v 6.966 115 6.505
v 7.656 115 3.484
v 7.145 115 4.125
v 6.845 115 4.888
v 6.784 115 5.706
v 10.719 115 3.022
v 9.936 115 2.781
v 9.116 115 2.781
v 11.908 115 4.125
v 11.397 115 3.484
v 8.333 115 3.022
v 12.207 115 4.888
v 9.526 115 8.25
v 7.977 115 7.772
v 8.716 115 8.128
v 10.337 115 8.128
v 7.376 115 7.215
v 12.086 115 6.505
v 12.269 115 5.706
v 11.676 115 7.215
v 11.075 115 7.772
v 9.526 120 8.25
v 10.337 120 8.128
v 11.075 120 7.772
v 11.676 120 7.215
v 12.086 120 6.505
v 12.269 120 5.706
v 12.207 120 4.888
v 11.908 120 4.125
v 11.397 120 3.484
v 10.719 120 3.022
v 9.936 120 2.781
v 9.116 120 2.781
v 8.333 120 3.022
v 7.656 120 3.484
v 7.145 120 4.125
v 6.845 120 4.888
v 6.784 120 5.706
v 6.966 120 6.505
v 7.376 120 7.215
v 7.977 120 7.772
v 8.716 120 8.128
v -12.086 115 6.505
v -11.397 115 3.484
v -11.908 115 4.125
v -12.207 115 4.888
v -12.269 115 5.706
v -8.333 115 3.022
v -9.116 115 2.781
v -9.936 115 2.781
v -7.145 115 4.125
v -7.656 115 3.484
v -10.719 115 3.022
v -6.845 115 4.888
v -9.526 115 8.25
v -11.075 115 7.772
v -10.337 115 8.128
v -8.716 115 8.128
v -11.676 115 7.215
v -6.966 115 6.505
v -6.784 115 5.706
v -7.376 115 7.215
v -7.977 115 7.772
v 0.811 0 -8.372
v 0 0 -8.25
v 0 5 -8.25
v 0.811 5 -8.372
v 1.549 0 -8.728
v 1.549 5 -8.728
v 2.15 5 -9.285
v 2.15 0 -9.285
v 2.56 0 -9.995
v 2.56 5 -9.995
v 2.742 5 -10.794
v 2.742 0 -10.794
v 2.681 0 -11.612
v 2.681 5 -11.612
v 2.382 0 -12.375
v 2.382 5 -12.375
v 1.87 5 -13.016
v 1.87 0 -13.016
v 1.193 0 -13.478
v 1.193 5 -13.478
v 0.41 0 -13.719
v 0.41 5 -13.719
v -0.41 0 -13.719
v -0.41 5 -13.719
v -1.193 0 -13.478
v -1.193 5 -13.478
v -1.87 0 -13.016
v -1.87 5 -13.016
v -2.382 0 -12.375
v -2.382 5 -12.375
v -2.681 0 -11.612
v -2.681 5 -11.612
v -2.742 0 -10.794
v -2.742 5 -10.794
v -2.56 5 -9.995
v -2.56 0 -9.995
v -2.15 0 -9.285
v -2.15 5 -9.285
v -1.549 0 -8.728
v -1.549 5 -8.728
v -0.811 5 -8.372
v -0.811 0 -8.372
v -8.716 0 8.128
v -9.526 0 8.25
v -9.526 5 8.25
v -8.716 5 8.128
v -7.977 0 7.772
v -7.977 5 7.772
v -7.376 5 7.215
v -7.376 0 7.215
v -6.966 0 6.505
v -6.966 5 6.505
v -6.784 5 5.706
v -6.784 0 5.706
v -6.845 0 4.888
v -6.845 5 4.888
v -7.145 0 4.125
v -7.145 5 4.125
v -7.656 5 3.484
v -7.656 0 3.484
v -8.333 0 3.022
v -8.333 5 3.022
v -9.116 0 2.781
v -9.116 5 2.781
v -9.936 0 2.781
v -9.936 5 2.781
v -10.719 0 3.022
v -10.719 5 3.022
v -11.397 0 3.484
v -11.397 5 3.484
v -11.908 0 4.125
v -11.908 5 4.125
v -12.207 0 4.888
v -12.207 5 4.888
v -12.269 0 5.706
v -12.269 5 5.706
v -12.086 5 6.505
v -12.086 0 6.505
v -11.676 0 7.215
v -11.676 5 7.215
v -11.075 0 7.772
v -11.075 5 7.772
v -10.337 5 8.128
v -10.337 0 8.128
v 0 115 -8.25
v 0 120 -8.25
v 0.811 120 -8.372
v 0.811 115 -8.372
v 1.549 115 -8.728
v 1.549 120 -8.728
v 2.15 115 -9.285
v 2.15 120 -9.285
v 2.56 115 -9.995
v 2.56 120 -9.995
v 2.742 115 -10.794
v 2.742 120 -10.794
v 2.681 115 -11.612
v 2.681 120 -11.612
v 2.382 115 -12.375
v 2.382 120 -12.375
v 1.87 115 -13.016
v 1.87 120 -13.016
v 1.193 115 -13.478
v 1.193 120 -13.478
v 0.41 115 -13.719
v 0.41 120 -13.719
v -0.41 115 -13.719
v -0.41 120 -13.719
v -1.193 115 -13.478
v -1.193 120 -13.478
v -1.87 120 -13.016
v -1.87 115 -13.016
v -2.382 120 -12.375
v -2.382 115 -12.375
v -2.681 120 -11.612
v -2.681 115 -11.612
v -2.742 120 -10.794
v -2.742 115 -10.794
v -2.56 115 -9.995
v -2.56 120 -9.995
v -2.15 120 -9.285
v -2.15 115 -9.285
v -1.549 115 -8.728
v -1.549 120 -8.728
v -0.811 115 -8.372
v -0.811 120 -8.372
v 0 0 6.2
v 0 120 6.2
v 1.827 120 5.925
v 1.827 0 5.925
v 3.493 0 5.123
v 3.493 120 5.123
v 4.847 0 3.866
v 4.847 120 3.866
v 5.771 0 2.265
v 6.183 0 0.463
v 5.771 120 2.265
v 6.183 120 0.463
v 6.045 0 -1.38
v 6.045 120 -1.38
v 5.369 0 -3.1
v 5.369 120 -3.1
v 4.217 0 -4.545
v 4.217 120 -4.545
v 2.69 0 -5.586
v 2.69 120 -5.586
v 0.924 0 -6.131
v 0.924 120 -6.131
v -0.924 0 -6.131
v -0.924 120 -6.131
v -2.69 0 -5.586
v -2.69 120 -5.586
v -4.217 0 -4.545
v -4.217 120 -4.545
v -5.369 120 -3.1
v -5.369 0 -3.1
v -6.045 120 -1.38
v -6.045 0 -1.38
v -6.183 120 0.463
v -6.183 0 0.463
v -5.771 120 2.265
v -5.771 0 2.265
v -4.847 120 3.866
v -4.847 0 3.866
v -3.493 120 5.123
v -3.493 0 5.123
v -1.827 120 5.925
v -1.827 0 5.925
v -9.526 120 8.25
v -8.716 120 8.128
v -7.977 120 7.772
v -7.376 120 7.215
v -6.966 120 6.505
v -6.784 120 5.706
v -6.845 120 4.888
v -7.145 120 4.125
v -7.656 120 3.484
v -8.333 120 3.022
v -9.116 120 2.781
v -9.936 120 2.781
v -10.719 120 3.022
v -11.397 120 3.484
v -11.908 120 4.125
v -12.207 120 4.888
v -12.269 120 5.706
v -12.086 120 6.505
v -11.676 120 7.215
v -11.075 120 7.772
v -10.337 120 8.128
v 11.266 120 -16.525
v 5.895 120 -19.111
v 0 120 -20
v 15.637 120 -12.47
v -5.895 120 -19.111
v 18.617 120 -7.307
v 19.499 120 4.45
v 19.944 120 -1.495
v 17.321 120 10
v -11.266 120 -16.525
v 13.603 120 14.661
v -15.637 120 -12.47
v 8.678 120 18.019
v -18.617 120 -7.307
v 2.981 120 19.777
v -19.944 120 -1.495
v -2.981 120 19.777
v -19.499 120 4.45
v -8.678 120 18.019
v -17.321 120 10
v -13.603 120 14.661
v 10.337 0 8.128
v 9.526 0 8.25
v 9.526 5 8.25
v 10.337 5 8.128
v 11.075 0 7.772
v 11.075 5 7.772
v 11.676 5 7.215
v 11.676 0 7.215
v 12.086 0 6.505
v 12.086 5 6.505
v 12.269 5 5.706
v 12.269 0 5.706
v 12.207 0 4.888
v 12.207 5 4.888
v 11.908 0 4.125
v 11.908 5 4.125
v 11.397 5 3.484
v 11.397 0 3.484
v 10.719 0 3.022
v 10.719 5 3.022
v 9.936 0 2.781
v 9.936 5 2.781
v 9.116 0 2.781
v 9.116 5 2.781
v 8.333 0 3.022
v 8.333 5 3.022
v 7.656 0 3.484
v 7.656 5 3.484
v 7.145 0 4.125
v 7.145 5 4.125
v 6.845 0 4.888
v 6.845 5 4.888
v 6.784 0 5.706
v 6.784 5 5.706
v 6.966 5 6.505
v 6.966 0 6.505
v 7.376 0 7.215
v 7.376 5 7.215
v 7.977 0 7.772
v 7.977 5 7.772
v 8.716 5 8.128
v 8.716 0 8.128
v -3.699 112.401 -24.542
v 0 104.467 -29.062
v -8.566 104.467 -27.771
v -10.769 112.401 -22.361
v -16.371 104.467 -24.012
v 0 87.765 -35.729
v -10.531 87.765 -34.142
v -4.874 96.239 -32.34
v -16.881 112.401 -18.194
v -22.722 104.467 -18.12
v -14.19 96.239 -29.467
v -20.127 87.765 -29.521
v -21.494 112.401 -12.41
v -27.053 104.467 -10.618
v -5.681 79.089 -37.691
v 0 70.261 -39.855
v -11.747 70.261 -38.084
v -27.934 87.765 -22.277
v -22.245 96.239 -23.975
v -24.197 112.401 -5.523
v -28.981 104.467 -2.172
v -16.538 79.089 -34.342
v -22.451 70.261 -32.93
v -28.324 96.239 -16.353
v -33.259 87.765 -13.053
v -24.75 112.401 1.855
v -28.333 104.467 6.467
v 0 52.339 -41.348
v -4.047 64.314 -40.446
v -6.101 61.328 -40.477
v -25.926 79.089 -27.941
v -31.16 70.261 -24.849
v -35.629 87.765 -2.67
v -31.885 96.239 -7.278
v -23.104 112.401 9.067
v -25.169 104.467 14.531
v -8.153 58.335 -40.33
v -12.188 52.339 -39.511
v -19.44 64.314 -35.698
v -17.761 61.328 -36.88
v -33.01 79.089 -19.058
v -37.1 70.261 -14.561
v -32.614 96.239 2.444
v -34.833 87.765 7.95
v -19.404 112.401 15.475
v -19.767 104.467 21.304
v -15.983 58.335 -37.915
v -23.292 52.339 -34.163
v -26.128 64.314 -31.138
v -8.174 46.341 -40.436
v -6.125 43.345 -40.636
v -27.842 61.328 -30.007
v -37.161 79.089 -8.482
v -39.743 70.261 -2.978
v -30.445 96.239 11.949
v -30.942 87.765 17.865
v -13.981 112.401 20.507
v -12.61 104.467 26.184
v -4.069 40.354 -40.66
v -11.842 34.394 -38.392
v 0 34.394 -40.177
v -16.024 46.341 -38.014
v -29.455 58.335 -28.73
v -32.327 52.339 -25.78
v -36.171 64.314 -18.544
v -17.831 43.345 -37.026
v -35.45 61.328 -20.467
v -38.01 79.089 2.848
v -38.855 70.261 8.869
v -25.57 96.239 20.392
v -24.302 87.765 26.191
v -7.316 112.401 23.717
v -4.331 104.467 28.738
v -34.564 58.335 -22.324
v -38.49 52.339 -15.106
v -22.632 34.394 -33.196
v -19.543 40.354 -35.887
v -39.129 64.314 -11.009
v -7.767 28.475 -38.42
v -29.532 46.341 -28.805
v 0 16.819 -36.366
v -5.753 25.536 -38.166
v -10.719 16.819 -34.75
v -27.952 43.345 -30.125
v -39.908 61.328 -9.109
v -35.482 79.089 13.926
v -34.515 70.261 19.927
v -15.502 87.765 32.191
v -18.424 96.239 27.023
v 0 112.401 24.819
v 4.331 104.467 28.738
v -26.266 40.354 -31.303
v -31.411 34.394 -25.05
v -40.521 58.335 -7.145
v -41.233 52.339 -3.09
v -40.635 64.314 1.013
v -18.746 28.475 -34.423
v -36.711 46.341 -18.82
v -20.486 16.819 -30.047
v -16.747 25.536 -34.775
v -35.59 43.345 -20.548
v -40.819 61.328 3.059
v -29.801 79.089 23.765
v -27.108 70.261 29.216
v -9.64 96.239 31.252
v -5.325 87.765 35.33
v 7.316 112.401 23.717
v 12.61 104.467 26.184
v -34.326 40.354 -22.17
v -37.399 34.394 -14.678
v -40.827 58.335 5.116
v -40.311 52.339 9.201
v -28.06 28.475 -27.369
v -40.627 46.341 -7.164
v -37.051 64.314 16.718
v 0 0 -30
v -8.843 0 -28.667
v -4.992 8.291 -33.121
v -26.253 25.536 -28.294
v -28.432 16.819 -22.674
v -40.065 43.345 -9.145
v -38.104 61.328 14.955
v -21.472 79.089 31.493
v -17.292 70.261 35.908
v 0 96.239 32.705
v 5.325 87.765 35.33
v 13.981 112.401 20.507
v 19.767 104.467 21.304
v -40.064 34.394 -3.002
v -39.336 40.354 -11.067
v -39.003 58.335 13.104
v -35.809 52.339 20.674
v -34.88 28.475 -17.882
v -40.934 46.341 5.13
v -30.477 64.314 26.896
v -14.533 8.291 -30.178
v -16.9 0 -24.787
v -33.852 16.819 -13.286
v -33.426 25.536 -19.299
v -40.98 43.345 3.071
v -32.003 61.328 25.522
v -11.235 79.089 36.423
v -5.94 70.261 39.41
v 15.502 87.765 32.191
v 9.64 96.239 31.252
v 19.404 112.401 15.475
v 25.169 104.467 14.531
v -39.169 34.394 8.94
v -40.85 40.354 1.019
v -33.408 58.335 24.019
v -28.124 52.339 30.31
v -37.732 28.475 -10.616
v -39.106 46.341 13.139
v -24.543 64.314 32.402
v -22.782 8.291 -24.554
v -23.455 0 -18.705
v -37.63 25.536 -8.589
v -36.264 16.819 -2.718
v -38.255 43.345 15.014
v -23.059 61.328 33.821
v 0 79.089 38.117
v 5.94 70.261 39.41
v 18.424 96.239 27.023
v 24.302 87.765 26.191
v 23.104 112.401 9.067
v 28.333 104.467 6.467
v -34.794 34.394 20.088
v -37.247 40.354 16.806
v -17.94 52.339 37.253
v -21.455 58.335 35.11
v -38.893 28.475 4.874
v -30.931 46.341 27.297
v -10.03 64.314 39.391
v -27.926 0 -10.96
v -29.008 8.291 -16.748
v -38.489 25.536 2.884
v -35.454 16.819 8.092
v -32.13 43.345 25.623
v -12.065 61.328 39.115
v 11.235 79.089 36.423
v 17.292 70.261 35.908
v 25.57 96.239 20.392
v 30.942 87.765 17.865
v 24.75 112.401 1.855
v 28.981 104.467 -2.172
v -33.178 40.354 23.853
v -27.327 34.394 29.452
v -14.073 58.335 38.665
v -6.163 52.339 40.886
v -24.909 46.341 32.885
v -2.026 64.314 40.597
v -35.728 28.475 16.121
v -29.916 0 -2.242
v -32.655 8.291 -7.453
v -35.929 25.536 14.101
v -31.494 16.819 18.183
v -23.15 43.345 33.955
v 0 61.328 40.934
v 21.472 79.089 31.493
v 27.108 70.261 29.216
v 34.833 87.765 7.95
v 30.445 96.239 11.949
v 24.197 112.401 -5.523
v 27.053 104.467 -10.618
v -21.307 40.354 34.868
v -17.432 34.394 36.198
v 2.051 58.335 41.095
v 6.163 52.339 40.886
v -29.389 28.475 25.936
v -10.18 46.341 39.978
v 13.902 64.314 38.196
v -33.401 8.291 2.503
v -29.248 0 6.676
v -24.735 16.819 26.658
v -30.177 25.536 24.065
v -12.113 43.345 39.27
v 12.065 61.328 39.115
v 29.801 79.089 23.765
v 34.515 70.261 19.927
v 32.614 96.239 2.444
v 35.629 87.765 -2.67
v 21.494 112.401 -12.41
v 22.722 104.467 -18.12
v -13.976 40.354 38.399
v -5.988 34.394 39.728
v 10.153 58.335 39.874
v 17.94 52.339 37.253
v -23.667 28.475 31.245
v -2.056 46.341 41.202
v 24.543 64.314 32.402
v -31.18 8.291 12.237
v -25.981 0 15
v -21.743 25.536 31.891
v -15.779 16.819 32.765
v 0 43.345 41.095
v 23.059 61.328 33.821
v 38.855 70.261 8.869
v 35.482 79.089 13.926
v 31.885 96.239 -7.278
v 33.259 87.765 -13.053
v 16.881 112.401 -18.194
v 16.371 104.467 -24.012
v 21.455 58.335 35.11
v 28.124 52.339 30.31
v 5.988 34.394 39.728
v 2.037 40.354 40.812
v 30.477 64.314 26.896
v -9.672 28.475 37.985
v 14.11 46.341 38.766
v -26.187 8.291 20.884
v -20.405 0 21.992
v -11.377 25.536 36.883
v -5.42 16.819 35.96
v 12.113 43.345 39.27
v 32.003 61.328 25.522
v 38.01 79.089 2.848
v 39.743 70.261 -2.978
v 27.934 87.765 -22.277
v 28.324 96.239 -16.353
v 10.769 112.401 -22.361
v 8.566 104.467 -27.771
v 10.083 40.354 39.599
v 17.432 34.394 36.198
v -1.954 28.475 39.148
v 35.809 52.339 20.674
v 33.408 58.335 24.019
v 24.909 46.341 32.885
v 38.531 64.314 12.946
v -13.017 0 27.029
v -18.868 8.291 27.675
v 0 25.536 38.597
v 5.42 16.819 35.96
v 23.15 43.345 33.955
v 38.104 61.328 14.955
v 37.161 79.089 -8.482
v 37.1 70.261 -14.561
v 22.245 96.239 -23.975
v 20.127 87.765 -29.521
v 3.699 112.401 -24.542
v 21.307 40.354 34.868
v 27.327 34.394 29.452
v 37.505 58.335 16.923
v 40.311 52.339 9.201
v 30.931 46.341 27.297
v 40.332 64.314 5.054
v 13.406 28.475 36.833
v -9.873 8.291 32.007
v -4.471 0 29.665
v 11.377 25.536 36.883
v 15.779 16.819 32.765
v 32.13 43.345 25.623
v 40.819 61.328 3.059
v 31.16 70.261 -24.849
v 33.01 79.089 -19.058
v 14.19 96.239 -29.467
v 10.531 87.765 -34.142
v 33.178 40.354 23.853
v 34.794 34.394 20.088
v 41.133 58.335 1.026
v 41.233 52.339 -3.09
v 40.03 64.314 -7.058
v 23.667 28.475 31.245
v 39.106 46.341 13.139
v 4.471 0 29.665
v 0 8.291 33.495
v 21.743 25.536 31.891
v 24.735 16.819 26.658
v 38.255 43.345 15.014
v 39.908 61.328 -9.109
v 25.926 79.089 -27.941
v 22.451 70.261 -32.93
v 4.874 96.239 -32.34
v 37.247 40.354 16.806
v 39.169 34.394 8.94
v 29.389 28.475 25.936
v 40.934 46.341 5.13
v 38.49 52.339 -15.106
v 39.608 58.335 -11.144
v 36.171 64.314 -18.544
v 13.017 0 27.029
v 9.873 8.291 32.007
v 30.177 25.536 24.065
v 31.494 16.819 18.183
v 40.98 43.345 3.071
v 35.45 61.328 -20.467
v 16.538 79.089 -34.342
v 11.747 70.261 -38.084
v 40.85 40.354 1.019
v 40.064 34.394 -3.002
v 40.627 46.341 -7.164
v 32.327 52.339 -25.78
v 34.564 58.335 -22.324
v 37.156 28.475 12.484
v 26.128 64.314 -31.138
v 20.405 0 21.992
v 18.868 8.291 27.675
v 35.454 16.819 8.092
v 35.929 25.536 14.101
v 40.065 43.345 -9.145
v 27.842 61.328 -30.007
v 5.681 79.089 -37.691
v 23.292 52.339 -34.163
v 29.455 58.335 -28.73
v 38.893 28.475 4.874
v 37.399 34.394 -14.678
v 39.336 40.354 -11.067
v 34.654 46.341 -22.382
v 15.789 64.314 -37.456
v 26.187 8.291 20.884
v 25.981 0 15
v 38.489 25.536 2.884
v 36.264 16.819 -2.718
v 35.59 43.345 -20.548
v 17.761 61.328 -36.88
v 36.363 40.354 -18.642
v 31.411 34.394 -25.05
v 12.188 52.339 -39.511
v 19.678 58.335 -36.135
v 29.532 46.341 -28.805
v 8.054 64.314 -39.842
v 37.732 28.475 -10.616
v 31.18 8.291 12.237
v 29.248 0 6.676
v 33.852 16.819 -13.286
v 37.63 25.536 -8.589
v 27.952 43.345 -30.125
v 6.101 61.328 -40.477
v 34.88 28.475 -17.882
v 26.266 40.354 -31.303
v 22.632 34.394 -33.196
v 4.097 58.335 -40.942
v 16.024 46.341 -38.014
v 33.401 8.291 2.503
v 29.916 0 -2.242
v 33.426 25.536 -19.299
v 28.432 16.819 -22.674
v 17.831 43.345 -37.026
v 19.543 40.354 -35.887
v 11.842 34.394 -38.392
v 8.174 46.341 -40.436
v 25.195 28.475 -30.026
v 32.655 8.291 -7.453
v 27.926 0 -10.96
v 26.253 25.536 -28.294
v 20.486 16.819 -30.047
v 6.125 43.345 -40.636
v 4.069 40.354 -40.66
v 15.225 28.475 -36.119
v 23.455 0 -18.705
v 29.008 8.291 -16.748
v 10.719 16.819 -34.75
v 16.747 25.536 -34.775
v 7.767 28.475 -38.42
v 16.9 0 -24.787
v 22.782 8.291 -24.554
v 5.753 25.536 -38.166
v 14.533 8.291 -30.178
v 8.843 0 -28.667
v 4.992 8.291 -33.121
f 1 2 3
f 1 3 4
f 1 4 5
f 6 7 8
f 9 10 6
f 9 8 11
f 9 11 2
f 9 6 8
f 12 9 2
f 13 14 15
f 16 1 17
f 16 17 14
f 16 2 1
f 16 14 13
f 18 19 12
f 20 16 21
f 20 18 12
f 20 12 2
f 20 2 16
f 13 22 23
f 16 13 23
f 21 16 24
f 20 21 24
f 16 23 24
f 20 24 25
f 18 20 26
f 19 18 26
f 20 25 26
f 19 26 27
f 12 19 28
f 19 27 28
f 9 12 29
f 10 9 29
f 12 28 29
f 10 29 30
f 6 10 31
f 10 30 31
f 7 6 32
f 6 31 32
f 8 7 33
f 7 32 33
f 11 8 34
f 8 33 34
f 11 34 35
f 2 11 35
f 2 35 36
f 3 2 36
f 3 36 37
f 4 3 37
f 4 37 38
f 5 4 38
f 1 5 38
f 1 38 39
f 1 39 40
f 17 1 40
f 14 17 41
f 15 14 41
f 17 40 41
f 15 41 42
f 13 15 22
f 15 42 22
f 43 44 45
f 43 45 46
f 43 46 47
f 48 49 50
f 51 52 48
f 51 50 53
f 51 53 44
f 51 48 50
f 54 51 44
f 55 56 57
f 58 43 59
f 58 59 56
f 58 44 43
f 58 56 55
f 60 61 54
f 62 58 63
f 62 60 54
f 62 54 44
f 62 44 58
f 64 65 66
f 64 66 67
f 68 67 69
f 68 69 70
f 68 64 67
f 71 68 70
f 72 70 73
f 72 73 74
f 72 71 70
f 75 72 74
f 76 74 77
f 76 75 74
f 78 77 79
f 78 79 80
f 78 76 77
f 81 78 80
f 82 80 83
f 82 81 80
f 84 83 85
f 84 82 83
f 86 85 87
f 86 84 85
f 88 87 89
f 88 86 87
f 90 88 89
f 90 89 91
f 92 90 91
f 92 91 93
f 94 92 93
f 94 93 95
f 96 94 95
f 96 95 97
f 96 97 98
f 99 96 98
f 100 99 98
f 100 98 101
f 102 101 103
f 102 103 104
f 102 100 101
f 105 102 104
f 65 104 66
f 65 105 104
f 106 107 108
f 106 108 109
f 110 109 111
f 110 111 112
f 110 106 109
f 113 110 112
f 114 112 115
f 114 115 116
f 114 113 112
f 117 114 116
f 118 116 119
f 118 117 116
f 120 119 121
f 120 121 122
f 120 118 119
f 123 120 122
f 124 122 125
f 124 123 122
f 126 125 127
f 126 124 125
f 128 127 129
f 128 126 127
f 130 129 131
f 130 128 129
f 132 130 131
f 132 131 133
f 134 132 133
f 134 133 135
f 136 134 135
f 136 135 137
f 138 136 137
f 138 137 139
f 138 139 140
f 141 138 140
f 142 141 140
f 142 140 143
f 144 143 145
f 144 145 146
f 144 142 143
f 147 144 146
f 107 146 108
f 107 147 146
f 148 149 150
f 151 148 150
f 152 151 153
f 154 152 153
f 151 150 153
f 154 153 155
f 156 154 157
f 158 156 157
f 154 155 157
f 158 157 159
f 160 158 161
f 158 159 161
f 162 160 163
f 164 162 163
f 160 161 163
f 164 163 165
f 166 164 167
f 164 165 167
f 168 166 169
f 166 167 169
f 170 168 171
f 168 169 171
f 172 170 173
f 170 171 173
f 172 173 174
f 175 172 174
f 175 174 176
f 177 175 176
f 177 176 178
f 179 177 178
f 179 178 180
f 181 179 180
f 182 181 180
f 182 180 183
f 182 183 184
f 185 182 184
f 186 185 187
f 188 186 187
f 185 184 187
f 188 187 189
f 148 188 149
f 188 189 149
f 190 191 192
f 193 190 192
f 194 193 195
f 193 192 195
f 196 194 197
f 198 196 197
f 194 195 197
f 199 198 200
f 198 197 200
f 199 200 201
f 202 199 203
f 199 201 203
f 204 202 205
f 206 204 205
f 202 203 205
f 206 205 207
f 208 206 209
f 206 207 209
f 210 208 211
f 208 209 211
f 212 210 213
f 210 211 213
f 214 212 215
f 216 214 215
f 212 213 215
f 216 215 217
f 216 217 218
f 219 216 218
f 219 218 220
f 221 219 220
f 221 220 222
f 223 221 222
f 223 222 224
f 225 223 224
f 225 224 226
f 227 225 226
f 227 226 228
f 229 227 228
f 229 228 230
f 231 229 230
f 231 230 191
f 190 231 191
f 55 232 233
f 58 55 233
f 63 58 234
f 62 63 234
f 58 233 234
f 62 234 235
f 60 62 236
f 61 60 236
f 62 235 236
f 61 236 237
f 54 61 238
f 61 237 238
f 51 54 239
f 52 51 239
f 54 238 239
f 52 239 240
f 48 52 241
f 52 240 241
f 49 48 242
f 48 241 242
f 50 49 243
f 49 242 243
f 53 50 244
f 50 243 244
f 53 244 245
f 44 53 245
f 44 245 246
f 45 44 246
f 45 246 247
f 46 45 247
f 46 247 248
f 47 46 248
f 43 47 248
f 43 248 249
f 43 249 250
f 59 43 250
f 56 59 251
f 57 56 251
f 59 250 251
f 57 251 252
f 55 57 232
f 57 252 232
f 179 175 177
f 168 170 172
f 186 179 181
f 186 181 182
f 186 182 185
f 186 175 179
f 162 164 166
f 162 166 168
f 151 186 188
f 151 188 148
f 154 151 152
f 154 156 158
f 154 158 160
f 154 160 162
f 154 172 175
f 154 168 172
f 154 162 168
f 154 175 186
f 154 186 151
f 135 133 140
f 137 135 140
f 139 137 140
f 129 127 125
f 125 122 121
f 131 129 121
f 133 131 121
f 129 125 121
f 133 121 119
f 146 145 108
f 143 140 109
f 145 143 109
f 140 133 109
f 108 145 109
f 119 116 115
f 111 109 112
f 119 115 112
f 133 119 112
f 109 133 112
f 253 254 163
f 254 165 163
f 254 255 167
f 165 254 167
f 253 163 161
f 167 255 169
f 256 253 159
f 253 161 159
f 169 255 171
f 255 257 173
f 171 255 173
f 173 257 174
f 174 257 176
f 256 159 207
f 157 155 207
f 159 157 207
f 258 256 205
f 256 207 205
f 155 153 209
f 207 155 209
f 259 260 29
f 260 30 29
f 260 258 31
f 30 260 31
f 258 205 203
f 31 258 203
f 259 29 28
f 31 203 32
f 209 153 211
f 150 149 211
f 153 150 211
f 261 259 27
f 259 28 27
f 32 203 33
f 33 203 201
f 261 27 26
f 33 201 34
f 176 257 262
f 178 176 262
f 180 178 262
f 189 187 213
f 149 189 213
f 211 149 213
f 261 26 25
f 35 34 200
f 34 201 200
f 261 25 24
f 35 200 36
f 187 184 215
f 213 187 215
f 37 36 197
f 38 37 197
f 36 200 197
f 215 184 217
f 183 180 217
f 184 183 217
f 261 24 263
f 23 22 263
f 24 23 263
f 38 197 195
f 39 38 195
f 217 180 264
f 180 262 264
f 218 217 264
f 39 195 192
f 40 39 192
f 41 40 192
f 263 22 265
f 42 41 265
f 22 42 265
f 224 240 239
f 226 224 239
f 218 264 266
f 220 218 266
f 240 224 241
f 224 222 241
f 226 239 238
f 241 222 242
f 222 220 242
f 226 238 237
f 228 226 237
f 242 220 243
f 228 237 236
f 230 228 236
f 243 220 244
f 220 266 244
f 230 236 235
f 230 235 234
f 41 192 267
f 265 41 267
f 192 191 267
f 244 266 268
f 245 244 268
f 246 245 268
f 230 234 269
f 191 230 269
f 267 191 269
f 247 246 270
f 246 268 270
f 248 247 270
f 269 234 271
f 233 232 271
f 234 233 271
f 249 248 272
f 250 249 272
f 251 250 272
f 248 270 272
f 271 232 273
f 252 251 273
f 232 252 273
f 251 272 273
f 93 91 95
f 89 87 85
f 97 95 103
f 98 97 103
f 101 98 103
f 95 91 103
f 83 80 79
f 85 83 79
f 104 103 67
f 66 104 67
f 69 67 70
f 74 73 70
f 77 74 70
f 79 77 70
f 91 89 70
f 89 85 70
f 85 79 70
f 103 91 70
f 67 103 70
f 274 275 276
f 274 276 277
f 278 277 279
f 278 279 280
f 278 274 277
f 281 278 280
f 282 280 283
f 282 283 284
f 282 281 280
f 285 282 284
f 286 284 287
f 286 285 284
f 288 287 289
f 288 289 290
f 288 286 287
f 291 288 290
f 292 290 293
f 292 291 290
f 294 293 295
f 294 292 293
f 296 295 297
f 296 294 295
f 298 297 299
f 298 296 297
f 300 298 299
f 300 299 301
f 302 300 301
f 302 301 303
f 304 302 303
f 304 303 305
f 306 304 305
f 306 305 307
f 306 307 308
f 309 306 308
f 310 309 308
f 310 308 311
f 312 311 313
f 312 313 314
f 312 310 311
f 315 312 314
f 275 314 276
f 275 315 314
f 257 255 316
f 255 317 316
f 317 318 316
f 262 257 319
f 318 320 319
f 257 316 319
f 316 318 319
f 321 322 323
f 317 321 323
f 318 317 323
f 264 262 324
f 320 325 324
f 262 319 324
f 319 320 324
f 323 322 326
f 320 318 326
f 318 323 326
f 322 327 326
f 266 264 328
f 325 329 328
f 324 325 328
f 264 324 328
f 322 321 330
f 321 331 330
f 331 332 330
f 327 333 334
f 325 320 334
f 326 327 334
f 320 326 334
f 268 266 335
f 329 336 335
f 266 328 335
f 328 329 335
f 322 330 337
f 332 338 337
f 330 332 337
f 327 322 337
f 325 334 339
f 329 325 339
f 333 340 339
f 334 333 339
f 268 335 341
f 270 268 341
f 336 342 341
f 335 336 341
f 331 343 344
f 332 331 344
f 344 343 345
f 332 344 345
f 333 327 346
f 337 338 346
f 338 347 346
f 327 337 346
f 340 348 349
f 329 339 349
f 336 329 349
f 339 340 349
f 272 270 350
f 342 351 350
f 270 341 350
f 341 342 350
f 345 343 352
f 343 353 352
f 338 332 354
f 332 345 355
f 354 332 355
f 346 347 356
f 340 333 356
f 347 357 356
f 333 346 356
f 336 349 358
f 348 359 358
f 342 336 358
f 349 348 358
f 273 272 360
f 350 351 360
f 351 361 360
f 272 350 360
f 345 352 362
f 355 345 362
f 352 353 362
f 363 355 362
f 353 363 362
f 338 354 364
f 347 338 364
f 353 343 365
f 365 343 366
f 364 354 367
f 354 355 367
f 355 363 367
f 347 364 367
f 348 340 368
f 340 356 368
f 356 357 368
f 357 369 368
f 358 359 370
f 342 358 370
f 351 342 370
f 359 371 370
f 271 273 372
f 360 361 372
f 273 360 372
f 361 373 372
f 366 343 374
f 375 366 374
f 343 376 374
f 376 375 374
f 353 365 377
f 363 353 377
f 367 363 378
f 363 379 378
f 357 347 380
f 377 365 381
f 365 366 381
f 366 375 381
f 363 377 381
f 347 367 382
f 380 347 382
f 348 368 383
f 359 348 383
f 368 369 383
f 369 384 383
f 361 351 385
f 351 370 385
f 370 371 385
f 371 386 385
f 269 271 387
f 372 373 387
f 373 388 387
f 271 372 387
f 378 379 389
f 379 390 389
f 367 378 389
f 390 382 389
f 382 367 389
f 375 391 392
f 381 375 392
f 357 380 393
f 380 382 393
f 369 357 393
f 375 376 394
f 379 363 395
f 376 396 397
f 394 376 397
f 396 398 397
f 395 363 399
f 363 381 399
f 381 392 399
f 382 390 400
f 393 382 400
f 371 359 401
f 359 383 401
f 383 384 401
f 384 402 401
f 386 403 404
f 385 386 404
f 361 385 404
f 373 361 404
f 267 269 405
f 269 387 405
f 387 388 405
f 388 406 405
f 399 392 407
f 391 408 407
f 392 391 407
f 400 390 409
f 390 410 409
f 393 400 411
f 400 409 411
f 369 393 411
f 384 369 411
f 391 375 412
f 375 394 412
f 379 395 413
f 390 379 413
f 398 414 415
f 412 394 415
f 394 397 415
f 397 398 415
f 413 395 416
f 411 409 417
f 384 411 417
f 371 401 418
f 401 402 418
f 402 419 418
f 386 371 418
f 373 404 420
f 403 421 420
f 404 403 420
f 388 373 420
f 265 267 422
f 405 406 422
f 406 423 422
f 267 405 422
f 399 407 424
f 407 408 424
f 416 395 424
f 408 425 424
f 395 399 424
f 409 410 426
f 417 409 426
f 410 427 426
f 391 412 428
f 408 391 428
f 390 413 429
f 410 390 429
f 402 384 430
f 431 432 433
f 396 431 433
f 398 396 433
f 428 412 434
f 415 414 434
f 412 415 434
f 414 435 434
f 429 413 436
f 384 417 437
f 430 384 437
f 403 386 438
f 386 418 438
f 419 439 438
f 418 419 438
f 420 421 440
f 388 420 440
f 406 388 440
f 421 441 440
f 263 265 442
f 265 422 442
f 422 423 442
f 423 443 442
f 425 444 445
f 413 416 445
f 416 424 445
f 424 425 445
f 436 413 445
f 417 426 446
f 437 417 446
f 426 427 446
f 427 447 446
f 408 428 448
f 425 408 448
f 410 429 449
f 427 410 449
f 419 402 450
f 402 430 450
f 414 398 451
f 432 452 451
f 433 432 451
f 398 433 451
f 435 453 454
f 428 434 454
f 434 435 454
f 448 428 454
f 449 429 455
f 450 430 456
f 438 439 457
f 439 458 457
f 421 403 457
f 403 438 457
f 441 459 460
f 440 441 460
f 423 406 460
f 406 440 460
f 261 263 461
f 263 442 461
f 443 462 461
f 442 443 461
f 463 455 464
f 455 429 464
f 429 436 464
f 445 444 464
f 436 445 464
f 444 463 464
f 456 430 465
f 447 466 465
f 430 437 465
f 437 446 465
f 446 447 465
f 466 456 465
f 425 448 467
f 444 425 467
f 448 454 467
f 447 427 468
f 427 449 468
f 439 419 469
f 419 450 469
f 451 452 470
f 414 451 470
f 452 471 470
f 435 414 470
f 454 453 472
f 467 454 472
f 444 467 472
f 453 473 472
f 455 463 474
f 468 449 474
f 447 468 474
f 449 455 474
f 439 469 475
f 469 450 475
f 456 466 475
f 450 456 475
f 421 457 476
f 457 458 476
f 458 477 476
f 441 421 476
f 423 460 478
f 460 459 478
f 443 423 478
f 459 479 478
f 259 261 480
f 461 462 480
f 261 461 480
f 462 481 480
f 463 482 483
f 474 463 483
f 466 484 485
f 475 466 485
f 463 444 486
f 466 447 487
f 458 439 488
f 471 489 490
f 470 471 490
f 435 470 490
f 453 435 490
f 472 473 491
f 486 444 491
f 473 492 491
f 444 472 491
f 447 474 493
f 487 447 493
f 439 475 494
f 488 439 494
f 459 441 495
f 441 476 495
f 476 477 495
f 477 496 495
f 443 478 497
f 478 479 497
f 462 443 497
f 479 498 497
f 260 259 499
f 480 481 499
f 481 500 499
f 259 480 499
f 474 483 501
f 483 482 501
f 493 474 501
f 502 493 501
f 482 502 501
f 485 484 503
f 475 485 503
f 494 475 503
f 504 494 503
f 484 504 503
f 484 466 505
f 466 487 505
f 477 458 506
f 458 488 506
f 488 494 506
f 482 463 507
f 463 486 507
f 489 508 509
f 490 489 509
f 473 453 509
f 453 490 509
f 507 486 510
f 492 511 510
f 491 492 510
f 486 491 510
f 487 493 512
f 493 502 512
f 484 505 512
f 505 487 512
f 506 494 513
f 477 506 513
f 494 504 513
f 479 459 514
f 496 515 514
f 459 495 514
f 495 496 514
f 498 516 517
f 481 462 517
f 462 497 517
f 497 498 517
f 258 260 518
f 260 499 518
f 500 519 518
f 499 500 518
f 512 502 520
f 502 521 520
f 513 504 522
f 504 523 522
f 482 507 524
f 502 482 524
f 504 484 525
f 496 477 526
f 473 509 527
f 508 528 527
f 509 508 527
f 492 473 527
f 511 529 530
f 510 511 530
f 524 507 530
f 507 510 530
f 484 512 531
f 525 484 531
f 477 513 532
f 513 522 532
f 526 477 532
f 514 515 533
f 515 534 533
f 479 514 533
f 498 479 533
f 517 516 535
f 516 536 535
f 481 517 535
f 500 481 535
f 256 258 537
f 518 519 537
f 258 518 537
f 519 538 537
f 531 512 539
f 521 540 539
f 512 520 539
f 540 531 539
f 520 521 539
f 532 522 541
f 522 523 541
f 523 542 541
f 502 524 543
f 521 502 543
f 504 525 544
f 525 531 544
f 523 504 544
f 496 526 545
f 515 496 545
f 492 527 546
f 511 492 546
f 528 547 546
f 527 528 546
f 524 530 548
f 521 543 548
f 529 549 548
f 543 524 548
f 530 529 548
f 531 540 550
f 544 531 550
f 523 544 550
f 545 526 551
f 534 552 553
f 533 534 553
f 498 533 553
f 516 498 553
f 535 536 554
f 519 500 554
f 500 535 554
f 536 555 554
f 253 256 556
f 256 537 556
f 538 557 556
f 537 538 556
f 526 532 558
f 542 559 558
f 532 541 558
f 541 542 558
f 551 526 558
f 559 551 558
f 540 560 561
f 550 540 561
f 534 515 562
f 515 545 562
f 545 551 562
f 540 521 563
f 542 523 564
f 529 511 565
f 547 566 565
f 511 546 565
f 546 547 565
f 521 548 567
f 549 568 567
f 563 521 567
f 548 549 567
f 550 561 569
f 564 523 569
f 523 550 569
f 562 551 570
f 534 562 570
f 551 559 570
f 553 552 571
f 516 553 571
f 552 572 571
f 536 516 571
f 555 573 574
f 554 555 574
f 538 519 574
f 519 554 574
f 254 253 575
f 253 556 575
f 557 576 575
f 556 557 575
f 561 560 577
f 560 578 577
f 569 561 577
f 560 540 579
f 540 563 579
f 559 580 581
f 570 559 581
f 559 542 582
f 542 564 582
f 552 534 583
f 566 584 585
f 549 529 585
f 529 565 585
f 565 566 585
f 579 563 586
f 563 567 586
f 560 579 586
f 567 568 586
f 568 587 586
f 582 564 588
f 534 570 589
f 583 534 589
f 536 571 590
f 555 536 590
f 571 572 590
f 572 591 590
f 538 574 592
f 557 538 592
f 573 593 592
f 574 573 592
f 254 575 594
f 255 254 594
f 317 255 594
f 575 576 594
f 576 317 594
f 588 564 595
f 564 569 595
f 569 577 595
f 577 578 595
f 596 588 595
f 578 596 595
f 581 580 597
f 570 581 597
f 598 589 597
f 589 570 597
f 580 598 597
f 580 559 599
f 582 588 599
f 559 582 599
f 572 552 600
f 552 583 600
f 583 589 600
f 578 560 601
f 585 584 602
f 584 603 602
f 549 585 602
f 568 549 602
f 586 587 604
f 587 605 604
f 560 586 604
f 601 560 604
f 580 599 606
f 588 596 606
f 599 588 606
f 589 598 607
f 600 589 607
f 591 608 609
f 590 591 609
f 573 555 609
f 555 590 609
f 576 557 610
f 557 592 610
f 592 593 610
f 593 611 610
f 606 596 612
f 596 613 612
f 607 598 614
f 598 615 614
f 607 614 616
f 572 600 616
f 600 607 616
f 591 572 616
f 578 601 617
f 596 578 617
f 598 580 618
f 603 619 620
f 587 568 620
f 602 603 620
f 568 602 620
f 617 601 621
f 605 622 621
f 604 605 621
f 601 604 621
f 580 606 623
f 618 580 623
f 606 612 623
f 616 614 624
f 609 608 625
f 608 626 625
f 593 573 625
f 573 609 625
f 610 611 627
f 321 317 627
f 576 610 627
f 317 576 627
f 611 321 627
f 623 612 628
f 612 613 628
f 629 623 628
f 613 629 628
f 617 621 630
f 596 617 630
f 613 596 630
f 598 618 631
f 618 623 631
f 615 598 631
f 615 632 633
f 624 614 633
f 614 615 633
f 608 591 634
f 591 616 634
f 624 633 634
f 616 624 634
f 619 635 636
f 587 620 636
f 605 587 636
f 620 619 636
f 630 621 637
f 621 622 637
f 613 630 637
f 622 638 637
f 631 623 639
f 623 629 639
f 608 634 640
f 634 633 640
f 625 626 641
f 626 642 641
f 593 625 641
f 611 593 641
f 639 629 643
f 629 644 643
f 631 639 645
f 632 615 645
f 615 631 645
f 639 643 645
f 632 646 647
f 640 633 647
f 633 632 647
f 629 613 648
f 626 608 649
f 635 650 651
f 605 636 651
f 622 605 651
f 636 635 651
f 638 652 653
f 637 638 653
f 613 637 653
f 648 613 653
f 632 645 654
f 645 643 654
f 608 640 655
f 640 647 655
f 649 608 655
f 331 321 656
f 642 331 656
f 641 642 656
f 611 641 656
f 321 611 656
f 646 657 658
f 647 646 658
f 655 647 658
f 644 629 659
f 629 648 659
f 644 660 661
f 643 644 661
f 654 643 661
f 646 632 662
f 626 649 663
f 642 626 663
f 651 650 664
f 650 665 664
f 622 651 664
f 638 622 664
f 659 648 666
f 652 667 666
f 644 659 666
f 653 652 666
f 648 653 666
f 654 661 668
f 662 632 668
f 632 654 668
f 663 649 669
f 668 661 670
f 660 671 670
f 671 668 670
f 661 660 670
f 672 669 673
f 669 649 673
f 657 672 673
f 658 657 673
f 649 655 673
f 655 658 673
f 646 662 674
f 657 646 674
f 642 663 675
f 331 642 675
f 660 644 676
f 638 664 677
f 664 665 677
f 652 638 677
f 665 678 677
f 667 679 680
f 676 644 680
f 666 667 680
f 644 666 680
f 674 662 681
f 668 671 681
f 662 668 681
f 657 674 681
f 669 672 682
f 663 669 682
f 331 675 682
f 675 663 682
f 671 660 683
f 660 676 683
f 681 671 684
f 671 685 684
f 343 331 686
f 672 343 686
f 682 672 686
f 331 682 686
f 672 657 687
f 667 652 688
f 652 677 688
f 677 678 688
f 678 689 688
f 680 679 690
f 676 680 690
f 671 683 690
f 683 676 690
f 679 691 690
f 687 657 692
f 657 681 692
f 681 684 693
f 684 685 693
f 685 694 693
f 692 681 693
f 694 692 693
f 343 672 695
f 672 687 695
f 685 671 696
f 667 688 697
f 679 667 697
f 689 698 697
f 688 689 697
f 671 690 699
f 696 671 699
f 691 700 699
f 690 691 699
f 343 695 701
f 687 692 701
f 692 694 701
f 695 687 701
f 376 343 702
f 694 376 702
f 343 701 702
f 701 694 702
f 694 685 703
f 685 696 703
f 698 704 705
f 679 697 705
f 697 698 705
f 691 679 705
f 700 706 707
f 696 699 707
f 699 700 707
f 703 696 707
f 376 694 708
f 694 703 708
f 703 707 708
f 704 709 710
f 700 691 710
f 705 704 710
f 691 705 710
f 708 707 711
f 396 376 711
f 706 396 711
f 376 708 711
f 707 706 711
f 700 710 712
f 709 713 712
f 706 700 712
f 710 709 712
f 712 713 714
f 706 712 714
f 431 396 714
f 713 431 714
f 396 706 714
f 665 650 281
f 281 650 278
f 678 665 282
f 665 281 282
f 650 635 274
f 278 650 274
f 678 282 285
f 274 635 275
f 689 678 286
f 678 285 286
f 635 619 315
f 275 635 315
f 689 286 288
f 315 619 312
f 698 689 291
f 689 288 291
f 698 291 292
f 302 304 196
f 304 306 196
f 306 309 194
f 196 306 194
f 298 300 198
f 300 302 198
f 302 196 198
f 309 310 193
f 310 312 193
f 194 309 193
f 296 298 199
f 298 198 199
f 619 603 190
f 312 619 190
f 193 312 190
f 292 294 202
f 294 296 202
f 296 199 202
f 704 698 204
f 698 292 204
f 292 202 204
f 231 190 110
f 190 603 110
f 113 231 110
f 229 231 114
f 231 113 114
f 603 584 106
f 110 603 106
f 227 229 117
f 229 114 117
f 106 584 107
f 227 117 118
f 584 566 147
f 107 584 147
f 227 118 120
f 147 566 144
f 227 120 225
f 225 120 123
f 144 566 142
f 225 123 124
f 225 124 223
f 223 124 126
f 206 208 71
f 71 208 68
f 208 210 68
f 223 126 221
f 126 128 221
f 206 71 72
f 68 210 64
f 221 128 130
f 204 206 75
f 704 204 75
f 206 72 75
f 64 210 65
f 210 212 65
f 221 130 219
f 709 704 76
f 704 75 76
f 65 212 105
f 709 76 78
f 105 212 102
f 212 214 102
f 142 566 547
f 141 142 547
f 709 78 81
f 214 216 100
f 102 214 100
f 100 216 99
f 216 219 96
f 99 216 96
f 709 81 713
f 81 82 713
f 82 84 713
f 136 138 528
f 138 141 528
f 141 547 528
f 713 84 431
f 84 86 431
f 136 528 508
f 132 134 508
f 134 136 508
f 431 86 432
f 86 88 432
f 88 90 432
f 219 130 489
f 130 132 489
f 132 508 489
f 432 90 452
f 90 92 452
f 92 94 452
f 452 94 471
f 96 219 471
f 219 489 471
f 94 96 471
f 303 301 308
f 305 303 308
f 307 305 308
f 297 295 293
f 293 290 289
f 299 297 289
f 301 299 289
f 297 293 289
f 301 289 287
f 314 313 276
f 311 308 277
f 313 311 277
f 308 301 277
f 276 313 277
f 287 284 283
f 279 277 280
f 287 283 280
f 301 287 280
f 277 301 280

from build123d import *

# Parameters (mm, degrees)
SKETCH_2_R          = 2.75
CUT_EXTRUDE_1_DEPTH = 5
SKETCH_3_R          = 6.2
CUT_EXTRUDE_2_DEPTH = 134.492132213


with BuildPart() as part:
    # ｽｹｯﾁ1 → 回転1 (revolve)
    with BuildSketch(Plane.XY, mode=Mode.PRIVATE) as revolve_1_sk:
        with BuildLine():
            Line((-30, 0), (0, 0))
            Line((0, 0), (0, 120))
            Line((0, 120), (-20, 120))
            ThreePointArc((-20, 120), (-40.933866224, 61.327822185), (-30, 0))
        make_face()
    revolve(revolve_1_sk.sketch.rotate(Axis((0, 0, 0), (0, 1, 0)), 270), axis=Axis((0, 0, 0), (0, 1, 0)))

    # ｽｹｯﾁ2 → ｶｯﾄ - 押し出し1 (cut)
    with BuildSketch(Plane(origin=(0, 120, 0), x_dir=(1, 0, 0), z_dir=(0, 1, 0))):
        with Locations(Location((0, 11, 0), (0, 0, 270))):
            Circle(SKETCH_2_R)
        with Locations(Location((9.526279442, -5.5, 0), (0, 0, 270))):
            Circle(SKETCH_2_R)
        with Locations(Location((-9.526279442, -5.5, 0), (0, 0, 270))):
            Circle(SKETCH_2_R)
    cut_extrude_1 = extrude(amount=-CUT_EXTRUDE_1_DEPTH, mode=Mode.SUBTRACT)

    # ﾐﾗｰ1: ｶｯﾄ - 押し出し1 across plane
    add(cut_extrude_1.mirror(Plane.ZX.offset(60)), mode=Mode.SUBTRACT)

    # ｽｹｯﾁ3 → ｶｯﾄ - 押し出し2 (cut, through all)
    with BuildSketch(Plane(origin=(0, 120, 0), x_dir=(1, 0, 0), z_dir=(0, 1, 0))):
        with Locations(Location((0, 0, 0), (0, 0, 270))):
            Circle(SKETCH_3_R)
    extrude(amount=-CUT_EXTRUDE_2_DEPTH, mode=Mode.SUBTRACT)


solid = part.part
